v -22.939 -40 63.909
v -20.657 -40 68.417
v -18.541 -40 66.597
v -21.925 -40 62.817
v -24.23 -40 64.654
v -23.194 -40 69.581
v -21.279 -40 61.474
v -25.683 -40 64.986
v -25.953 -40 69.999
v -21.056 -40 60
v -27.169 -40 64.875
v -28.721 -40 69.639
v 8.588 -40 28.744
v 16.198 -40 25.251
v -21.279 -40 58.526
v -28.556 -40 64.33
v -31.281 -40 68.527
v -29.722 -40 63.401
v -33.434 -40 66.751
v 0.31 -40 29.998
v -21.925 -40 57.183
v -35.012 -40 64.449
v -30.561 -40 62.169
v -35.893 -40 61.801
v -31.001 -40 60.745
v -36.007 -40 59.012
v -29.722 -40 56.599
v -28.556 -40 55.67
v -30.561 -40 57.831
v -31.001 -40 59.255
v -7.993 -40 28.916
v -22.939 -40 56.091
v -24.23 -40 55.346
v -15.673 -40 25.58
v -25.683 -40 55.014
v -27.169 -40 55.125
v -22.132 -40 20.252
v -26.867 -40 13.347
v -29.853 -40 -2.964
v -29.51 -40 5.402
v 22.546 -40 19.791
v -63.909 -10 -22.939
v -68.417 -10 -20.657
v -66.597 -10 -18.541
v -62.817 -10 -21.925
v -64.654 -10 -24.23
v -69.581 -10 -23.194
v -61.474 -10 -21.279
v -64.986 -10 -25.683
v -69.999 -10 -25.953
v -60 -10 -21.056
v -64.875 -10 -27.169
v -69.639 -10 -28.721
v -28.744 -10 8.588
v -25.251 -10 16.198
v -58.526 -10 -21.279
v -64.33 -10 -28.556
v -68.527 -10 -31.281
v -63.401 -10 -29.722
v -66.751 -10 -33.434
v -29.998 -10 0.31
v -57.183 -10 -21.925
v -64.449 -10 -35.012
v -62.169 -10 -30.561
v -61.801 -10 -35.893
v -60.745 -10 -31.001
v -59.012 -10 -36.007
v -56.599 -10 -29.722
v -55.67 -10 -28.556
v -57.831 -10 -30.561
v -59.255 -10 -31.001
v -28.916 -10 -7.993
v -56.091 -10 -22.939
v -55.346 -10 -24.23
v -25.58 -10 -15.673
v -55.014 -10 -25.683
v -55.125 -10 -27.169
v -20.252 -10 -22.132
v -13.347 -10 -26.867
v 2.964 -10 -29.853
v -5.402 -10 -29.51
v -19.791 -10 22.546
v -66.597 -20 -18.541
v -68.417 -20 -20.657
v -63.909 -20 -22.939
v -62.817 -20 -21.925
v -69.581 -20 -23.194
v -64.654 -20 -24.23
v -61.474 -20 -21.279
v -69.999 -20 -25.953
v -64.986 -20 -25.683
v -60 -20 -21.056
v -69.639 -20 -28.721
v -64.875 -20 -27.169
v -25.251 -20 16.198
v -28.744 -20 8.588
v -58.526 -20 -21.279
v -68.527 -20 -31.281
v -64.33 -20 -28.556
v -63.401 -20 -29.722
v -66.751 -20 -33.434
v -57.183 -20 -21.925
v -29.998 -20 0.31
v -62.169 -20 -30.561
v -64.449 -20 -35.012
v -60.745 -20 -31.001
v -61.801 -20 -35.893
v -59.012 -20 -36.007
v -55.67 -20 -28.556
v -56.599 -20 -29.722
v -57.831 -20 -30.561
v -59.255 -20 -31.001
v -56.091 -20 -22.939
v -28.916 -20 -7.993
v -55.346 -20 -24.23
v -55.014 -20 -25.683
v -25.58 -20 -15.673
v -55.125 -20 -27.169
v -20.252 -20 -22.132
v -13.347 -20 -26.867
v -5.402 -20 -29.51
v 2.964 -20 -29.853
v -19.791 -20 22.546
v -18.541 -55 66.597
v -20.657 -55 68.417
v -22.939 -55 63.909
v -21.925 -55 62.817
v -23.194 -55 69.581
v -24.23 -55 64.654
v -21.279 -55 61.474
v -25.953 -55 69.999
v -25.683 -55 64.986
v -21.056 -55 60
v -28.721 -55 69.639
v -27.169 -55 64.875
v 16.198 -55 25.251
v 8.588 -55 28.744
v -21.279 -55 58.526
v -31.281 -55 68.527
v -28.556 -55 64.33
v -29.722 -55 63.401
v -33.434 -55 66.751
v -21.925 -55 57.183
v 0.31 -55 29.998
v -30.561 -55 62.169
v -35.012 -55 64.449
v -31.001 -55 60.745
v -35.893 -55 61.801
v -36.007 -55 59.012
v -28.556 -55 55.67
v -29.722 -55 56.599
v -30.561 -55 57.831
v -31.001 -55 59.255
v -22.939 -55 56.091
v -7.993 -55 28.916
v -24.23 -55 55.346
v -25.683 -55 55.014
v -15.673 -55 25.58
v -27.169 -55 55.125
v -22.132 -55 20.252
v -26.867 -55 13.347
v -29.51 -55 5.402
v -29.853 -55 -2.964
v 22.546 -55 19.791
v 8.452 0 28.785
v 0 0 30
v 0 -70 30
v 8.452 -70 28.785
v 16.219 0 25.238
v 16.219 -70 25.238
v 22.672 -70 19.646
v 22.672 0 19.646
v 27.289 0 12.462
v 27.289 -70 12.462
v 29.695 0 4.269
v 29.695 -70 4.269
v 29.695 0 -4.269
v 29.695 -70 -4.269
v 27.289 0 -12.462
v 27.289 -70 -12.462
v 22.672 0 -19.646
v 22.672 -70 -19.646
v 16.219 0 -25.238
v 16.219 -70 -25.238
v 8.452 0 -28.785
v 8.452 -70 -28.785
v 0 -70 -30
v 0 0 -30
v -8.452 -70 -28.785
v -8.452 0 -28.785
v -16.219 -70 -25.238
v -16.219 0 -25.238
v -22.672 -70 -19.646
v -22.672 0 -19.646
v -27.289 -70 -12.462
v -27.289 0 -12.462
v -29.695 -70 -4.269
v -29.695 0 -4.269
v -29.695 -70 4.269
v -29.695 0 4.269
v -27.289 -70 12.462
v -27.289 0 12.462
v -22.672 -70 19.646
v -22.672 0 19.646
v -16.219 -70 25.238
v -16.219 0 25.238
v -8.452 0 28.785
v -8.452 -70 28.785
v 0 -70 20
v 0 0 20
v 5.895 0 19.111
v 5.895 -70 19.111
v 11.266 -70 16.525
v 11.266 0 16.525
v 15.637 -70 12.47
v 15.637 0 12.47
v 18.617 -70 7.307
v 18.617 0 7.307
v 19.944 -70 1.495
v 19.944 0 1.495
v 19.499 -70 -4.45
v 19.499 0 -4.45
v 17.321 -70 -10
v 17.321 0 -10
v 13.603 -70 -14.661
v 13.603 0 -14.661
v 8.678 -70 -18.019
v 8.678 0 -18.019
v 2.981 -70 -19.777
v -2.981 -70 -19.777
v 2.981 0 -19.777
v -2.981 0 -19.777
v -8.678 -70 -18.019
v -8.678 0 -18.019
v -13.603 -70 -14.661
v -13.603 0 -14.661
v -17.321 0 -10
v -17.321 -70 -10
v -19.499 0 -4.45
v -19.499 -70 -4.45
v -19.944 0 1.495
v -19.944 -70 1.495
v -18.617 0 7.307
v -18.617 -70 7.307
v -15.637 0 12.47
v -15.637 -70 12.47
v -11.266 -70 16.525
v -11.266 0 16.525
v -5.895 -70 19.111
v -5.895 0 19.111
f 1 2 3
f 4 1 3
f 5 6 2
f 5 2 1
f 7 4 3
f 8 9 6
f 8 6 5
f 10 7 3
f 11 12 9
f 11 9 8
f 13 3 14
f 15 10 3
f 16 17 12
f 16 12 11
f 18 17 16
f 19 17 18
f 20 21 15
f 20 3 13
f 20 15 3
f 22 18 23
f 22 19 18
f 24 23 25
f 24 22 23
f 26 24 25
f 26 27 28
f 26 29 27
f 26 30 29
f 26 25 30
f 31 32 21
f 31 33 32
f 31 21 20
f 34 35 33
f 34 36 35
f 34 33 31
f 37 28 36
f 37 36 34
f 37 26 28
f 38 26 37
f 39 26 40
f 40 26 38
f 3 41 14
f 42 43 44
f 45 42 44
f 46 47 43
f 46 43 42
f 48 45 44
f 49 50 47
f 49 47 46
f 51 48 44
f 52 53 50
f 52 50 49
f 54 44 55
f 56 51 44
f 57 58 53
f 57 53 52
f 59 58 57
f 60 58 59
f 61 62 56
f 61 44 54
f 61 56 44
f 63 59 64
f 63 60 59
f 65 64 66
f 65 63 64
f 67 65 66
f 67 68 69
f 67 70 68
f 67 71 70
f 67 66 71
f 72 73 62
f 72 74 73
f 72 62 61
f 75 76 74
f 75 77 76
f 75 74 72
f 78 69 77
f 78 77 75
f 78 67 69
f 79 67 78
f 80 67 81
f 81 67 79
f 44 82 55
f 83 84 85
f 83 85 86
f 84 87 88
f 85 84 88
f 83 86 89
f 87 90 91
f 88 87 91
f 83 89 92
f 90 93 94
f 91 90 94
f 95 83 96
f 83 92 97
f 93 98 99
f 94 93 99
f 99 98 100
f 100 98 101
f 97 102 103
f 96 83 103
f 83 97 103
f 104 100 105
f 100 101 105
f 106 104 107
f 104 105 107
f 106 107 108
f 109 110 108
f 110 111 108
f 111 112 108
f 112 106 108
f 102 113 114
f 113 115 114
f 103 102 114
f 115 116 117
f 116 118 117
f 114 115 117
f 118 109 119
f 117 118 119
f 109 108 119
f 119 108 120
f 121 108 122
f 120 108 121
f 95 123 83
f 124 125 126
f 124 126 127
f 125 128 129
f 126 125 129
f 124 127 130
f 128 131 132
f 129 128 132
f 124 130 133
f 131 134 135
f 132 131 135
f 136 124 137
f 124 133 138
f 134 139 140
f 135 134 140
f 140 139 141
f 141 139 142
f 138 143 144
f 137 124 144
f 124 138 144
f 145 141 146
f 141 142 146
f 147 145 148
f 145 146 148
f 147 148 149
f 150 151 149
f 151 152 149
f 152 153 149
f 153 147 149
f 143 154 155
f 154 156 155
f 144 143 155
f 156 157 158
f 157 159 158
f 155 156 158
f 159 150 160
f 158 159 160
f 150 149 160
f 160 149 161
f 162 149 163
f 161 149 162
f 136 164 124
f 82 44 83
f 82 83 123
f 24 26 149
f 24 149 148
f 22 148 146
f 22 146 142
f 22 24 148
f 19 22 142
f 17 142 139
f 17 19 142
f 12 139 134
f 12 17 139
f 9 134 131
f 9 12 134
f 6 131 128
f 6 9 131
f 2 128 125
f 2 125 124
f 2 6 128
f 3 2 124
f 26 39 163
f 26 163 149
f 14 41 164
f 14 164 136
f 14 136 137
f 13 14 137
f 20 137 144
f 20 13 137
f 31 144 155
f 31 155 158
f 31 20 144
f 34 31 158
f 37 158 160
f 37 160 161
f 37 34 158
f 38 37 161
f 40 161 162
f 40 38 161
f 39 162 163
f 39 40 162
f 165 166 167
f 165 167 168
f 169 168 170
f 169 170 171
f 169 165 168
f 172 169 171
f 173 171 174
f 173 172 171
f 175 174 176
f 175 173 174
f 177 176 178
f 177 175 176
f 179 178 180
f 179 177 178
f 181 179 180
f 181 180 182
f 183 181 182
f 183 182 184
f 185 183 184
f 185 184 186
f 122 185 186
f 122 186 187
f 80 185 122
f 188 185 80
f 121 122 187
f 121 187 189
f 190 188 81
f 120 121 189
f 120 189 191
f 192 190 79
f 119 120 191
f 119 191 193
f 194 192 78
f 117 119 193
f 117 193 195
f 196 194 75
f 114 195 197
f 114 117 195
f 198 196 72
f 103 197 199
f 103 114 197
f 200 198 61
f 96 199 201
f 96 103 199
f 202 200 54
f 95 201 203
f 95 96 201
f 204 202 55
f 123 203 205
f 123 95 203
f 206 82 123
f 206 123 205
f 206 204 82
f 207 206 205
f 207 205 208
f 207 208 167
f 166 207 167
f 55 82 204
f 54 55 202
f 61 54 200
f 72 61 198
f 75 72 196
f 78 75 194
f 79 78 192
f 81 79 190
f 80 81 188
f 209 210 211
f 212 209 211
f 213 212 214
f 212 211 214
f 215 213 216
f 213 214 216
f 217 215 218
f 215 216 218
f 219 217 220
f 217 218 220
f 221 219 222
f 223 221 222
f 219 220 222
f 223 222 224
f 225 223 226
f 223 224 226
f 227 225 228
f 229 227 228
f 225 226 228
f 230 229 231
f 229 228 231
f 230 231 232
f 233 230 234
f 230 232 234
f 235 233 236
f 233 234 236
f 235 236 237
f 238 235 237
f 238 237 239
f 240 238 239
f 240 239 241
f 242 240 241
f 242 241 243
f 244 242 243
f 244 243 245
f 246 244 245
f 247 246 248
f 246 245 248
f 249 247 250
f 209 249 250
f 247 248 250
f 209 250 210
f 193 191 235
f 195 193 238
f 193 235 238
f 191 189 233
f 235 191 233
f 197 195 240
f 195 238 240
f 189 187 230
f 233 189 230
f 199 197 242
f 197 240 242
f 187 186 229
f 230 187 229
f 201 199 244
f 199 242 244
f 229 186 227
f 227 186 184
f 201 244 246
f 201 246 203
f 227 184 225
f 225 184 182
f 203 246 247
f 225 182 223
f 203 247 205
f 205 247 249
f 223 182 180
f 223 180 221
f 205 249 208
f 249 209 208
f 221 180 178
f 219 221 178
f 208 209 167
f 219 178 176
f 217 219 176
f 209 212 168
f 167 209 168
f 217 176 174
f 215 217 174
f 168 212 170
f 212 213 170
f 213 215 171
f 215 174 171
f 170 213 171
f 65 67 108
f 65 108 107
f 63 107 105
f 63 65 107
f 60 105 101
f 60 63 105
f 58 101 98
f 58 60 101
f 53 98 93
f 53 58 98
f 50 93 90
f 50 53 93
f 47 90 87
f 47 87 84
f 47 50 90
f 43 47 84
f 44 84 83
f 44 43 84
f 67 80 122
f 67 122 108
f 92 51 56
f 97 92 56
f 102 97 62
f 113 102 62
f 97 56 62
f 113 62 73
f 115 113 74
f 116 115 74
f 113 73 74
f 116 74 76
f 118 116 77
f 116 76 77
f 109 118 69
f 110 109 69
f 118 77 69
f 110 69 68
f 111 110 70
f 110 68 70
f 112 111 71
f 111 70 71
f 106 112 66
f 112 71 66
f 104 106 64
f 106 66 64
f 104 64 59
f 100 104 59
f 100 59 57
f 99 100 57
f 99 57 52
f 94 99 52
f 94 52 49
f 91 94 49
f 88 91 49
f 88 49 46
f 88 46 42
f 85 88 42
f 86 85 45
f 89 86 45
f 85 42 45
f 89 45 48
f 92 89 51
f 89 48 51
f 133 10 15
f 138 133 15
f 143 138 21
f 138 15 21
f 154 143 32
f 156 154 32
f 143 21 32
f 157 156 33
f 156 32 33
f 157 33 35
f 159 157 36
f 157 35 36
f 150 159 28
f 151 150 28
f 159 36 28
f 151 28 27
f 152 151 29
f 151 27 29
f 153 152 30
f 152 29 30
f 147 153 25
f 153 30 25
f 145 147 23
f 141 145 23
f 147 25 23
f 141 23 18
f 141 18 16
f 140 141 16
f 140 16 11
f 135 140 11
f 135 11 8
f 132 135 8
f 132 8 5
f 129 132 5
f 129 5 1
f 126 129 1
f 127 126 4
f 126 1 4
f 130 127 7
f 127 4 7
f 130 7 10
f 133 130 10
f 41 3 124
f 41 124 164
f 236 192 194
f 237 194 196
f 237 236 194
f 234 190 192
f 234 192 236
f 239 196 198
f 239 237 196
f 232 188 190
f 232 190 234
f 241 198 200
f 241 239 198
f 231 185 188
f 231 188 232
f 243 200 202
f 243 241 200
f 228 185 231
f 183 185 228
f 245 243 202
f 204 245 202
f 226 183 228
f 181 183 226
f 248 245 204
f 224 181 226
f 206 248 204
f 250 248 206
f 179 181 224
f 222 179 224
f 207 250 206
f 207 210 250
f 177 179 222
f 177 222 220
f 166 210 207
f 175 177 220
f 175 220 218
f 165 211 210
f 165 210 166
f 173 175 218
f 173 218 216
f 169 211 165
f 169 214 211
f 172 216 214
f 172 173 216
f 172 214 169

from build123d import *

# Parameters (mm, degrees)
SKETCH1_R             = 30
SKETCH1_R_2           = 20
BOSS_EXTRUDE1_DEPTH   = 70
BOSS_EXTRUDE2_START   = -10
SKETCH2_R             = 5
BOSS_EXTRUDE2_DEPTH   = 10
BOSS_EXTRUDE3_START   = -40
SKETCH2_3_R           = 5
BOSS_EXTRUDE3_DEPTH   = 15
BODY_MOVE_COPY1_ANGLE = 90


with BuildPart() as part:
    # Sketch1 → Boss-Extrude1 (new body)
    with BuildSketch(Plane(origin=(0, 0, 0), x_dir=(1, 0, 0), z_dir=(0, 1, 0))):
        Circle(SKETCH1_R)
        Circle(SKETCH1_R_2, mode=Mode.SUBTRACT)
    extrude(amount=-BOSS_EXTRUDE1_DEPTH)

    # Sketch2 → Boss-Extrude2 (add)
    with BuildSketch(Plane(origin=(0, 0, 0), x_dir=(1, 0, 0), z_dir=(0, 1, 0)).offset(BOSS_EXTRUDE2_START)):
        with BuildLine():
            Line((2.964427425, 29.853176884), (-59.011857525, 36.007436429))
            ThreePointArc((-59.011857525, 36.007436429), (-69.172409079, 30.039706689), (-66.597015029, 18.541100181))
            Line((-66.597015029, 18.541100181), (-19.791045088, -22.545831861))
            ThreePointArc((-19.791045088, -22.545831861), (-27.517227238, 11.949987663), (2.964427425, 29.853176884))
        make_face()
        with Locations((-60, 26.056377468)):
            Circle(SKETCH2_R, mode=Mode.SUBTRACT)
    extrude(amount=-BOSS_EXTRUDE2_DEPTH)


with BuildPart() as body_2:
    # Sketch2<3> → Boss-Extrude3 (new body)
    with BuildSketch(Plane(origin=(0, 0, 0), x_dir=(1, 0, 0), z_dir=(0, 1, 0)).offset(BOSS_EXTRUDE3_START)):
        with BuildLine():
            Line((2.964427425, 29.853176884), (-59.011857525, 36.007436429))
            ThreePointArc((-59.011857525, 36.007436429), (-69.172409079, 30.039706689), (-66.597015029, 18.541100181))
            Line((-66.597015029, 18.541100181), (-19.791045088, -22.545831861))
            ThreePointArc((-19.791045088, -22.545831861), (-27.517227238, 11.949987663), (2.964427425, 29.853176884))
        make_face()
        with Locations((-60, 26.056377468)):
            Circle(SKETCH2_3_R, mode=Mode.SUBTRACT)
    extrude(amount=-BOSS_EXTRUDE3_DEPTH)


with BuildPart() as body_2_1:
    # Body-Move/Copy1: moved
    add(body_2.part.rotate(Axis((0, 0, 0), (0, 1, 0)), BODY_MOVE_COPY1_ANGLE))


solid = Compound([part.part, body_2_1.part])
